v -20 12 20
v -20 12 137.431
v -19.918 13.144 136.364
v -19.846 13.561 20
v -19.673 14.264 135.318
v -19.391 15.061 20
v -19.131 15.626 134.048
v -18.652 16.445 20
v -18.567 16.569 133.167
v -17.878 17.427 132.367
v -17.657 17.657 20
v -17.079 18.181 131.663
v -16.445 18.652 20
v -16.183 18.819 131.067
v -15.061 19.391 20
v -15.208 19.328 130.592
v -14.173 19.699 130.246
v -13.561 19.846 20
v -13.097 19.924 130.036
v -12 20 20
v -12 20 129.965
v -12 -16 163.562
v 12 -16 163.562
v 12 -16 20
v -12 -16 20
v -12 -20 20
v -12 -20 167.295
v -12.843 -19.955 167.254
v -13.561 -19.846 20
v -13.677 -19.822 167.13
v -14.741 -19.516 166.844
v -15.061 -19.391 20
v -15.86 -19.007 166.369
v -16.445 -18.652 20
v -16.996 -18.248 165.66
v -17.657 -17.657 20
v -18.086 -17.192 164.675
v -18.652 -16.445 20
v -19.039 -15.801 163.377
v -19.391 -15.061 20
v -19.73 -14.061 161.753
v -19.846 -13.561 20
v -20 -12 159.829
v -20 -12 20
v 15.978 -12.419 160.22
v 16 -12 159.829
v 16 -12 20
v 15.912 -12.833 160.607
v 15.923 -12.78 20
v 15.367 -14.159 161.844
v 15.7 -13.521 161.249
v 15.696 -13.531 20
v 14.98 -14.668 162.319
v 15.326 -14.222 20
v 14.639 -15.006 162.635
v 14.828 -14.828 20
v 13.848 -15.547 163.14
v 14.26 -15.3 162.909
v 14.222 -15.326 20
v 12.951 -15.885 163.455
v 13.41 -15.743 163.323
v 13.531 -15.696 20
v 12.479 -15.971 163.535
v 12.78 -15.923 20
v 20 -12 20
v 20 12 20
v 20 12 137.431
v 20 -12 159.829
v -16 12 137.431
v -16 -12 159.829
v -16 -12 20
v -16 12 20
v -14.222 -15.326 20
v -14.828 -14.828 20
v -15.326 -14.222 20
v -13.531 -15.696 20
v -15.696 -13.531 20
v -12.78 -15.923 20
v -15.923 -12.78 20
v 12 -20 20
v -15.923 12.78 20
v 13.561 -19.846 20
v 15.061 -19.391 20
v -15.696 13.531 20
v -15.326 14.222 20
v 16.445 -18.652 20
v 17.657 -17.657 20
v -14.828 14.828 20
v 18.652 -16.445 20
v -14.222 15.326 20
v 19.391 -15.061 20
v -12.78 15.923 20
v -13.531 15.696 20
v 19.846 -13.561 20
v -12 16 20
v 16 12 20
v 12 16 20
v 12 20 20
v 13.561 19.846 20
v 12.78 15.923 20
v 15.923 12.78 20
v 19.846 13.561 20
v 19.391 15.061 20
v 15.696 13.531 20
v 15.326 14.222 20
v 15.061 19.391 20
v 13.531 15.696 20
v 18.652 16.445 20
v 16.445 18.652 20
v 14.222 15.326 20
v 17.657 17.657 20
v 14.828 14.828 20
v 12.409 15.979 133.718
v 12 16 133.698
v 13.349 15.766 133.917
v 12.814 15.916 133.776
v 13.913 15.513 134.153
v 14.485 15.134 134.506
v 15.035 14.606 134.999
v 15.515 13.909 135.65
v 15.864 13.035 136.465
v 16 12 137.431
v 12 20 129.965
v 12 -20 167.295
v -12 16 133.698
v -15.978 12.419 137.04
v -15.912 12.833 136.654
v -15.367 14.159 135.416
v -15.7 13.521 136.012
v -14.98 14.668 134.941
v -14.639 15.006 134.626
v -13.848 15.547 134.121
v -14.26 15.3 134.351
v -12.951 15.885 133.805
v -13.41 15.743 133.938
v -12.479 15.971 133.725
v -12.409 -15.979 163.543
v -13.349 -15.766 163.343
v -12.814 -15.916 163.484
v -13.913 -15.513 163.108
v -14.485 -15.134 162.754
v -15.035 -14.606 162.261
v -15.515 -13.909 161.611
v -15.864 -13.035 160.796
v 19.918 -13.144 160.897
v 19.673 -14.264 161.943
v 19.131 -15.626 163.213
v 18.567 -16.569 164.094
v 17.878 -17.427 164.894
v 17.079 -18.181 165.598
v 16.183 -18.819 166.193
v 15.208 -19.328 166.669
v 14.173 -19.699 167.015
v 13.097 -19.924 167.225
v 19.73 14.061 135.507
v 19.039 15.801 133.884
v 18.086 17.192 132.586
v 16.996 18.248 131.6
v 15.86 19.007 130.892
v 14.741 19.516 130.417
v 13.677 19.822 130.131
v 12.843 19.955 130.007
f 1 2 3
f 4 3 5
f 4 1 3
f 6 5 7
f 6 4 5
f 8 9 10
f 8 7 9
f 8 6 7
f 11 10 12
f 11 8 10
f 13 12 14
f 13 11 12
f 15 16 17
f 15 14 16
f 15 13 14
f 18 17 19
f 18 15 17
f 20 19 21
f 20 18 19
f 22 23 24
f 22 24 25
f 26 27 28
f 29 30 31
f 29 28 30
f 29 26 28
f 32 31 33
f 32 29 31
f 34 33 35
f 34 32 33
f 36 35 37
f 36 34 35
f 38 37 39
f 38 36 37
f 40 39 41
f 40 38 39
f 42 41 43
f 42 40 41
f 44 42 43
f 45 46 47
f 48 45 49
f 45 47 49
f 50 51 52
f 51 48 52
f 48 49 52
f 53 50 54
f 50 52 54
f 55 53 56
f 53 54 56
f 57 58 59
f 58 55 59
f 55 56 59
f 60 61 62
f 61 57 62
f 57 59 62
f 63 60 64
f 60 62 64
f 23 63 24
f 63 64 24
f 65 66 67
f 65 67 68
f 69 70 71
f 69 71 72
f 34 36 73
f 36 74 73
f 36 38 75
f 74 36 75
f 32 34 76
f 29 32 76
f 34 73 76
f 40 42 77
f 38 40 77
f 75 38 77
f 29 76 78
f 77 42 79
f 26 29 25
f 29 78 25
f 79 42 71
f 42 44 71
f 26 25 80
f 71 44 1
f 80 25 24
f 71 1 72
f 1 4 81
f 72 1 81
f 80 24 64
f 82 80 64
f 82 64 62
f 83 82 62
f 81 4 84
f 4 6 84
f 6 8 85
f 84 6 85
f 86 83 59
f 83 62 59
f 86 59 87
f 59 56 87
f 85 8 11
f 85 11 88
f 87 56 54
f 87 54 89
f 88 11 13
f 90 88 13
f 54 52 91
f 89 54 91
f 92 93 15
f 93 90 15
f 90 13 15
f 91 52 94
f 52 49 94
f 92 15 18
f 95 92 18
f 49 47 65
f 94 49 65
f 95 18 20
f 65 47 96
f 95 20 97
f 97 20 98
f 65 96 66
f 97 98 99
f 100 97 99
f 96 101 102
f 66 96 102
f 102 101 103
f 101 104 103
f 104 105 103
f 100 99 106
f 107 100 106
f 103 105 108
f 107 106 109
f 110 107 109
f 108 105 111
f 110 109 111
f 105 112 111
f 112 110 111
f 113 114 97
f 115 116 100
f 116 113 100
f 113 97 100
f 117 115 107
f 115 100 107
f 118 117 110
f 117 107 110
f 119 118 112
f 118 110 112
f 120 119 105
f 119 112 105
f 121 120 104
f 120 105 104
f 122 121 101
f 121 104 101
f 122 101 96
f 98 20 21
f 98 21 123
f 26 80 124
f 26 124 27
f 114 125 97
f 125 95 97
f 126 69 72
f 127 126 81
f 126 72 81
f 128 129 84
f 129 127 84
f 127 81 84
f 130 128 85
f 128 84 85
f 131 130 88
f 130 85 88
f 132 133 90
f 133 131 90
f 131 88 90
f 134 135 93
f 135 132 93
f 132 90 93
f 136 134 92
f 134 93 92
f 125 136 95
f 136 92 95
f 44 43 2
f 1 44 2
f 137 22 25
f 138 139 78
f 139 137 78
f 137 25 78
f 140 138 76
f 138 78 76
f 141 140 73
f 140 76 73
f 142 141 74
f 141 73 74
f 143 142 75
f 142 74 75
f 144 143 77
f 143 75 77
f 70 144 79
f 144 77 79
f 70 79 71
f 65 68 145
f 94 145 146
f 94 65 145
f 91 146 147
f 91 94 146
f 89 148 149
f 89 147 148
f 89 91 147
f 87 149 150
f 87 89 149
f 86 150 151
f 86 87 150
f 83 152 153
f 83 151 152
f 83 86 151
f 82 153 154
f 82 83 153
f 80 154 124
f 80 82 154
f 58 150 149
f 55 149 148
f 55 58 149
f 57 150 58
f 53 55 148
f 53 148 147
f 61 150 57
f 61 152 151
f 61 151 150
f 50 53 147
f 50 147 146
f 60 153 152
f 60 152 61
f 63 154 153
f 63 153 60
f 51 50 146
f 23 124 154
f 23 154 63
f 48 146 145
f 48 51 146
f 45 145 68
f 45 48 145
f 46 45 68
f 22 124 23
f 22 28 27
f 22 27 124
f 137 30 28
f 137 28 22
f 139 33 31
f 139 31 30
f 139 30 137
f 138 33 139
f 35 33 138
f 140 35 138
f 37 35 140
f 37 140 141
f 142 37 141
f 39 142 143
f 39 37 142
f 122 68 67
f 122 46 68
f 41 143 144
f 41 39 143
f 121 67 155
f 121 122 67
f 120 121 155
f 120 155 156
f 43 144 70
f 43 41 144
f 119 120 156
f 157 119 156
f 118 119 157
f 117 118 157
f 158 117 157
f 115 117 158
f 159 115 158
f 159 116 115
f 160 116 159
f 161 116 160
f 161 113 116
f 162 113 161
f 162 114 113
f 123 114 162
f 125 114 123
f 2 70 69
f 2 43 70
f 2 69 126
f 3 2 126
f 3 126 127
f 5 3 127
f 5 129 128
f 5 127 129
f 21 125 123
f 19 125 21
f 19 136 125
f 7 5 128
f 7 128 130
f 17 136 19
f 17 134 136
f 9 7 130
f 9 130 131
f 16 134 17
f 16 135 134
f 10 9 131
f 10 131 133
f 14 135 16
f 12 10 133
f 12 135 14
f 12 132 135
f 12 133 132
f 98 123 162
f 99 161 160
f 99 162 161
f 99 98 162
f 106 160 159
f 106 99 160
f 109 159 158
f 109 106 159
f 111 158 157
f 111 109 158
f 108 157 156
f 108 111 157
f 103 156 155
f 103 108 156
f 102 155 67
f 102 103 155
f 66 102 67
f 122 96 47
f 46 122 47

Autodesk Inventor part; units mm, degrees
ref_plane "Start Plane" through (0, 0, 20) normal (0, 0, 1) x (1, 0, 0)
ref_plane "End Plane" through (0, 0, 167.2955) normal (0, 0, 1) x (1, 0, 0)
sketch "Sketch" plane through (0, 0, 0) normal (0, 0, 1) x (1, 0, 0)
  line L0 (-20, -12) -> (-20, 12)
  line L1 (-12, 20) -> (12, 20)
  line L2 (20, 12) -> (20, -12)
  line L3 (12, -20) -> (-12, -20)
  arc A0 (-20, -12) -> (-12, -20) centre (-12, -12) ccw
  arc A1 (20, 12) -> (12, 20) centre (12, 12) ccw
  arc A2 (-12, 20) -> (-20, 12) centre (-12, 12) ccw
  arc A3 (12, -20) -> (20, -12) centre (12, -12) ccw
  arc A4 (-12, 16) -> (-16, 12) centre (-12, 12) ccw
  line L4 (-12, 16) -> (12, 16)
  arc A5 (16, 12) -> (12, 16) centre (12, 12) ccw
  line L5 (16, 12) -> (16, -12)
  arc A6 (12, -16) -> (16, -12) centre (12, -12) ccw
  line L6 (12, -16) -> (-12, -16)
  arc A7 (-16, -12) -> (-12, -16) centre (-12, -12) ccw
  line L7 (-16, -12) -> (-16, 12)
  line L8 (0, 30.3196) -> (0, -30.3196) construction
  line L9 (-30.3196, 0) -> (30.3196, 0) construction
  dimension "d7" = 8
  dimension "d9" = 40
  dimension "d11" = 40
  dimension "d12" = 4
  dimension "d15" = 20
  dimension "d16" = 20
extrude "Body" add sketch "Sketch" along normal up to surface (147.2955 mm away) from surface at 20
sketch "Sketch3" plane through (0, 0, 0) normal (0, 0, 1) x (1, 0, 0)
  line L0 (0, 0) -> (10, 0)
ref_plane "Work Plane3" through (0, 0, 0) normal (0, -1, 0) x (1, 0, 0)
ref_plane "Work Plane4" through (0, -20.6823, 167.9321) normal (0, 0.6823, 0.7311) x (1, 0, 0)
split "Split1" plane through (0, -20.6823, 167.9321) removes the side toward (0, 0.6823, 0.7311)
ref_plane "Work Plane5" through (-12, 6500, 20) normal (0, 0, -1) x (-1, 0, 0)
split "Split2" plane through (-12, 6500, 20) removes the side toward (0, 0, -1)
sketch "Sketch4" plane through (0, 0, 0) normal (0, -1, 0) x (1, 0, 0)
  line L0 (-2, 20) -> (12, 20) projected
  line L1 (-2, 167.2955) -> (12, 167.2955) projected
  dimension "d18" = 147.2955
equation "\"d7\" = G_IR"
equation "\"d9\" = G_W"
equation "\"d11\" = G_H"
equation "\"d12\" = G_T"
equation "\"d15\" = 0.5 * d9"
equation "\"d16\" = 0.5 * d11"
equation "\"d3\" = G_L"
equation "\"G_W\" = 40"
equation "\"G_H\" = 40"
equation "\"G_T\" = 4"
equation "\"G_IR\" = 8"
equation "\"G_L\" = d18"
equation "\"G_OFFSET_END\" = 17.29549"
equation "\"d14\" = G_OFFSET_END + B_L"
equation "\"B_L\" = 150"
properties part number "ISO 10799-2 - 40x40x4 - 147,3" material "Steel, Mild"
